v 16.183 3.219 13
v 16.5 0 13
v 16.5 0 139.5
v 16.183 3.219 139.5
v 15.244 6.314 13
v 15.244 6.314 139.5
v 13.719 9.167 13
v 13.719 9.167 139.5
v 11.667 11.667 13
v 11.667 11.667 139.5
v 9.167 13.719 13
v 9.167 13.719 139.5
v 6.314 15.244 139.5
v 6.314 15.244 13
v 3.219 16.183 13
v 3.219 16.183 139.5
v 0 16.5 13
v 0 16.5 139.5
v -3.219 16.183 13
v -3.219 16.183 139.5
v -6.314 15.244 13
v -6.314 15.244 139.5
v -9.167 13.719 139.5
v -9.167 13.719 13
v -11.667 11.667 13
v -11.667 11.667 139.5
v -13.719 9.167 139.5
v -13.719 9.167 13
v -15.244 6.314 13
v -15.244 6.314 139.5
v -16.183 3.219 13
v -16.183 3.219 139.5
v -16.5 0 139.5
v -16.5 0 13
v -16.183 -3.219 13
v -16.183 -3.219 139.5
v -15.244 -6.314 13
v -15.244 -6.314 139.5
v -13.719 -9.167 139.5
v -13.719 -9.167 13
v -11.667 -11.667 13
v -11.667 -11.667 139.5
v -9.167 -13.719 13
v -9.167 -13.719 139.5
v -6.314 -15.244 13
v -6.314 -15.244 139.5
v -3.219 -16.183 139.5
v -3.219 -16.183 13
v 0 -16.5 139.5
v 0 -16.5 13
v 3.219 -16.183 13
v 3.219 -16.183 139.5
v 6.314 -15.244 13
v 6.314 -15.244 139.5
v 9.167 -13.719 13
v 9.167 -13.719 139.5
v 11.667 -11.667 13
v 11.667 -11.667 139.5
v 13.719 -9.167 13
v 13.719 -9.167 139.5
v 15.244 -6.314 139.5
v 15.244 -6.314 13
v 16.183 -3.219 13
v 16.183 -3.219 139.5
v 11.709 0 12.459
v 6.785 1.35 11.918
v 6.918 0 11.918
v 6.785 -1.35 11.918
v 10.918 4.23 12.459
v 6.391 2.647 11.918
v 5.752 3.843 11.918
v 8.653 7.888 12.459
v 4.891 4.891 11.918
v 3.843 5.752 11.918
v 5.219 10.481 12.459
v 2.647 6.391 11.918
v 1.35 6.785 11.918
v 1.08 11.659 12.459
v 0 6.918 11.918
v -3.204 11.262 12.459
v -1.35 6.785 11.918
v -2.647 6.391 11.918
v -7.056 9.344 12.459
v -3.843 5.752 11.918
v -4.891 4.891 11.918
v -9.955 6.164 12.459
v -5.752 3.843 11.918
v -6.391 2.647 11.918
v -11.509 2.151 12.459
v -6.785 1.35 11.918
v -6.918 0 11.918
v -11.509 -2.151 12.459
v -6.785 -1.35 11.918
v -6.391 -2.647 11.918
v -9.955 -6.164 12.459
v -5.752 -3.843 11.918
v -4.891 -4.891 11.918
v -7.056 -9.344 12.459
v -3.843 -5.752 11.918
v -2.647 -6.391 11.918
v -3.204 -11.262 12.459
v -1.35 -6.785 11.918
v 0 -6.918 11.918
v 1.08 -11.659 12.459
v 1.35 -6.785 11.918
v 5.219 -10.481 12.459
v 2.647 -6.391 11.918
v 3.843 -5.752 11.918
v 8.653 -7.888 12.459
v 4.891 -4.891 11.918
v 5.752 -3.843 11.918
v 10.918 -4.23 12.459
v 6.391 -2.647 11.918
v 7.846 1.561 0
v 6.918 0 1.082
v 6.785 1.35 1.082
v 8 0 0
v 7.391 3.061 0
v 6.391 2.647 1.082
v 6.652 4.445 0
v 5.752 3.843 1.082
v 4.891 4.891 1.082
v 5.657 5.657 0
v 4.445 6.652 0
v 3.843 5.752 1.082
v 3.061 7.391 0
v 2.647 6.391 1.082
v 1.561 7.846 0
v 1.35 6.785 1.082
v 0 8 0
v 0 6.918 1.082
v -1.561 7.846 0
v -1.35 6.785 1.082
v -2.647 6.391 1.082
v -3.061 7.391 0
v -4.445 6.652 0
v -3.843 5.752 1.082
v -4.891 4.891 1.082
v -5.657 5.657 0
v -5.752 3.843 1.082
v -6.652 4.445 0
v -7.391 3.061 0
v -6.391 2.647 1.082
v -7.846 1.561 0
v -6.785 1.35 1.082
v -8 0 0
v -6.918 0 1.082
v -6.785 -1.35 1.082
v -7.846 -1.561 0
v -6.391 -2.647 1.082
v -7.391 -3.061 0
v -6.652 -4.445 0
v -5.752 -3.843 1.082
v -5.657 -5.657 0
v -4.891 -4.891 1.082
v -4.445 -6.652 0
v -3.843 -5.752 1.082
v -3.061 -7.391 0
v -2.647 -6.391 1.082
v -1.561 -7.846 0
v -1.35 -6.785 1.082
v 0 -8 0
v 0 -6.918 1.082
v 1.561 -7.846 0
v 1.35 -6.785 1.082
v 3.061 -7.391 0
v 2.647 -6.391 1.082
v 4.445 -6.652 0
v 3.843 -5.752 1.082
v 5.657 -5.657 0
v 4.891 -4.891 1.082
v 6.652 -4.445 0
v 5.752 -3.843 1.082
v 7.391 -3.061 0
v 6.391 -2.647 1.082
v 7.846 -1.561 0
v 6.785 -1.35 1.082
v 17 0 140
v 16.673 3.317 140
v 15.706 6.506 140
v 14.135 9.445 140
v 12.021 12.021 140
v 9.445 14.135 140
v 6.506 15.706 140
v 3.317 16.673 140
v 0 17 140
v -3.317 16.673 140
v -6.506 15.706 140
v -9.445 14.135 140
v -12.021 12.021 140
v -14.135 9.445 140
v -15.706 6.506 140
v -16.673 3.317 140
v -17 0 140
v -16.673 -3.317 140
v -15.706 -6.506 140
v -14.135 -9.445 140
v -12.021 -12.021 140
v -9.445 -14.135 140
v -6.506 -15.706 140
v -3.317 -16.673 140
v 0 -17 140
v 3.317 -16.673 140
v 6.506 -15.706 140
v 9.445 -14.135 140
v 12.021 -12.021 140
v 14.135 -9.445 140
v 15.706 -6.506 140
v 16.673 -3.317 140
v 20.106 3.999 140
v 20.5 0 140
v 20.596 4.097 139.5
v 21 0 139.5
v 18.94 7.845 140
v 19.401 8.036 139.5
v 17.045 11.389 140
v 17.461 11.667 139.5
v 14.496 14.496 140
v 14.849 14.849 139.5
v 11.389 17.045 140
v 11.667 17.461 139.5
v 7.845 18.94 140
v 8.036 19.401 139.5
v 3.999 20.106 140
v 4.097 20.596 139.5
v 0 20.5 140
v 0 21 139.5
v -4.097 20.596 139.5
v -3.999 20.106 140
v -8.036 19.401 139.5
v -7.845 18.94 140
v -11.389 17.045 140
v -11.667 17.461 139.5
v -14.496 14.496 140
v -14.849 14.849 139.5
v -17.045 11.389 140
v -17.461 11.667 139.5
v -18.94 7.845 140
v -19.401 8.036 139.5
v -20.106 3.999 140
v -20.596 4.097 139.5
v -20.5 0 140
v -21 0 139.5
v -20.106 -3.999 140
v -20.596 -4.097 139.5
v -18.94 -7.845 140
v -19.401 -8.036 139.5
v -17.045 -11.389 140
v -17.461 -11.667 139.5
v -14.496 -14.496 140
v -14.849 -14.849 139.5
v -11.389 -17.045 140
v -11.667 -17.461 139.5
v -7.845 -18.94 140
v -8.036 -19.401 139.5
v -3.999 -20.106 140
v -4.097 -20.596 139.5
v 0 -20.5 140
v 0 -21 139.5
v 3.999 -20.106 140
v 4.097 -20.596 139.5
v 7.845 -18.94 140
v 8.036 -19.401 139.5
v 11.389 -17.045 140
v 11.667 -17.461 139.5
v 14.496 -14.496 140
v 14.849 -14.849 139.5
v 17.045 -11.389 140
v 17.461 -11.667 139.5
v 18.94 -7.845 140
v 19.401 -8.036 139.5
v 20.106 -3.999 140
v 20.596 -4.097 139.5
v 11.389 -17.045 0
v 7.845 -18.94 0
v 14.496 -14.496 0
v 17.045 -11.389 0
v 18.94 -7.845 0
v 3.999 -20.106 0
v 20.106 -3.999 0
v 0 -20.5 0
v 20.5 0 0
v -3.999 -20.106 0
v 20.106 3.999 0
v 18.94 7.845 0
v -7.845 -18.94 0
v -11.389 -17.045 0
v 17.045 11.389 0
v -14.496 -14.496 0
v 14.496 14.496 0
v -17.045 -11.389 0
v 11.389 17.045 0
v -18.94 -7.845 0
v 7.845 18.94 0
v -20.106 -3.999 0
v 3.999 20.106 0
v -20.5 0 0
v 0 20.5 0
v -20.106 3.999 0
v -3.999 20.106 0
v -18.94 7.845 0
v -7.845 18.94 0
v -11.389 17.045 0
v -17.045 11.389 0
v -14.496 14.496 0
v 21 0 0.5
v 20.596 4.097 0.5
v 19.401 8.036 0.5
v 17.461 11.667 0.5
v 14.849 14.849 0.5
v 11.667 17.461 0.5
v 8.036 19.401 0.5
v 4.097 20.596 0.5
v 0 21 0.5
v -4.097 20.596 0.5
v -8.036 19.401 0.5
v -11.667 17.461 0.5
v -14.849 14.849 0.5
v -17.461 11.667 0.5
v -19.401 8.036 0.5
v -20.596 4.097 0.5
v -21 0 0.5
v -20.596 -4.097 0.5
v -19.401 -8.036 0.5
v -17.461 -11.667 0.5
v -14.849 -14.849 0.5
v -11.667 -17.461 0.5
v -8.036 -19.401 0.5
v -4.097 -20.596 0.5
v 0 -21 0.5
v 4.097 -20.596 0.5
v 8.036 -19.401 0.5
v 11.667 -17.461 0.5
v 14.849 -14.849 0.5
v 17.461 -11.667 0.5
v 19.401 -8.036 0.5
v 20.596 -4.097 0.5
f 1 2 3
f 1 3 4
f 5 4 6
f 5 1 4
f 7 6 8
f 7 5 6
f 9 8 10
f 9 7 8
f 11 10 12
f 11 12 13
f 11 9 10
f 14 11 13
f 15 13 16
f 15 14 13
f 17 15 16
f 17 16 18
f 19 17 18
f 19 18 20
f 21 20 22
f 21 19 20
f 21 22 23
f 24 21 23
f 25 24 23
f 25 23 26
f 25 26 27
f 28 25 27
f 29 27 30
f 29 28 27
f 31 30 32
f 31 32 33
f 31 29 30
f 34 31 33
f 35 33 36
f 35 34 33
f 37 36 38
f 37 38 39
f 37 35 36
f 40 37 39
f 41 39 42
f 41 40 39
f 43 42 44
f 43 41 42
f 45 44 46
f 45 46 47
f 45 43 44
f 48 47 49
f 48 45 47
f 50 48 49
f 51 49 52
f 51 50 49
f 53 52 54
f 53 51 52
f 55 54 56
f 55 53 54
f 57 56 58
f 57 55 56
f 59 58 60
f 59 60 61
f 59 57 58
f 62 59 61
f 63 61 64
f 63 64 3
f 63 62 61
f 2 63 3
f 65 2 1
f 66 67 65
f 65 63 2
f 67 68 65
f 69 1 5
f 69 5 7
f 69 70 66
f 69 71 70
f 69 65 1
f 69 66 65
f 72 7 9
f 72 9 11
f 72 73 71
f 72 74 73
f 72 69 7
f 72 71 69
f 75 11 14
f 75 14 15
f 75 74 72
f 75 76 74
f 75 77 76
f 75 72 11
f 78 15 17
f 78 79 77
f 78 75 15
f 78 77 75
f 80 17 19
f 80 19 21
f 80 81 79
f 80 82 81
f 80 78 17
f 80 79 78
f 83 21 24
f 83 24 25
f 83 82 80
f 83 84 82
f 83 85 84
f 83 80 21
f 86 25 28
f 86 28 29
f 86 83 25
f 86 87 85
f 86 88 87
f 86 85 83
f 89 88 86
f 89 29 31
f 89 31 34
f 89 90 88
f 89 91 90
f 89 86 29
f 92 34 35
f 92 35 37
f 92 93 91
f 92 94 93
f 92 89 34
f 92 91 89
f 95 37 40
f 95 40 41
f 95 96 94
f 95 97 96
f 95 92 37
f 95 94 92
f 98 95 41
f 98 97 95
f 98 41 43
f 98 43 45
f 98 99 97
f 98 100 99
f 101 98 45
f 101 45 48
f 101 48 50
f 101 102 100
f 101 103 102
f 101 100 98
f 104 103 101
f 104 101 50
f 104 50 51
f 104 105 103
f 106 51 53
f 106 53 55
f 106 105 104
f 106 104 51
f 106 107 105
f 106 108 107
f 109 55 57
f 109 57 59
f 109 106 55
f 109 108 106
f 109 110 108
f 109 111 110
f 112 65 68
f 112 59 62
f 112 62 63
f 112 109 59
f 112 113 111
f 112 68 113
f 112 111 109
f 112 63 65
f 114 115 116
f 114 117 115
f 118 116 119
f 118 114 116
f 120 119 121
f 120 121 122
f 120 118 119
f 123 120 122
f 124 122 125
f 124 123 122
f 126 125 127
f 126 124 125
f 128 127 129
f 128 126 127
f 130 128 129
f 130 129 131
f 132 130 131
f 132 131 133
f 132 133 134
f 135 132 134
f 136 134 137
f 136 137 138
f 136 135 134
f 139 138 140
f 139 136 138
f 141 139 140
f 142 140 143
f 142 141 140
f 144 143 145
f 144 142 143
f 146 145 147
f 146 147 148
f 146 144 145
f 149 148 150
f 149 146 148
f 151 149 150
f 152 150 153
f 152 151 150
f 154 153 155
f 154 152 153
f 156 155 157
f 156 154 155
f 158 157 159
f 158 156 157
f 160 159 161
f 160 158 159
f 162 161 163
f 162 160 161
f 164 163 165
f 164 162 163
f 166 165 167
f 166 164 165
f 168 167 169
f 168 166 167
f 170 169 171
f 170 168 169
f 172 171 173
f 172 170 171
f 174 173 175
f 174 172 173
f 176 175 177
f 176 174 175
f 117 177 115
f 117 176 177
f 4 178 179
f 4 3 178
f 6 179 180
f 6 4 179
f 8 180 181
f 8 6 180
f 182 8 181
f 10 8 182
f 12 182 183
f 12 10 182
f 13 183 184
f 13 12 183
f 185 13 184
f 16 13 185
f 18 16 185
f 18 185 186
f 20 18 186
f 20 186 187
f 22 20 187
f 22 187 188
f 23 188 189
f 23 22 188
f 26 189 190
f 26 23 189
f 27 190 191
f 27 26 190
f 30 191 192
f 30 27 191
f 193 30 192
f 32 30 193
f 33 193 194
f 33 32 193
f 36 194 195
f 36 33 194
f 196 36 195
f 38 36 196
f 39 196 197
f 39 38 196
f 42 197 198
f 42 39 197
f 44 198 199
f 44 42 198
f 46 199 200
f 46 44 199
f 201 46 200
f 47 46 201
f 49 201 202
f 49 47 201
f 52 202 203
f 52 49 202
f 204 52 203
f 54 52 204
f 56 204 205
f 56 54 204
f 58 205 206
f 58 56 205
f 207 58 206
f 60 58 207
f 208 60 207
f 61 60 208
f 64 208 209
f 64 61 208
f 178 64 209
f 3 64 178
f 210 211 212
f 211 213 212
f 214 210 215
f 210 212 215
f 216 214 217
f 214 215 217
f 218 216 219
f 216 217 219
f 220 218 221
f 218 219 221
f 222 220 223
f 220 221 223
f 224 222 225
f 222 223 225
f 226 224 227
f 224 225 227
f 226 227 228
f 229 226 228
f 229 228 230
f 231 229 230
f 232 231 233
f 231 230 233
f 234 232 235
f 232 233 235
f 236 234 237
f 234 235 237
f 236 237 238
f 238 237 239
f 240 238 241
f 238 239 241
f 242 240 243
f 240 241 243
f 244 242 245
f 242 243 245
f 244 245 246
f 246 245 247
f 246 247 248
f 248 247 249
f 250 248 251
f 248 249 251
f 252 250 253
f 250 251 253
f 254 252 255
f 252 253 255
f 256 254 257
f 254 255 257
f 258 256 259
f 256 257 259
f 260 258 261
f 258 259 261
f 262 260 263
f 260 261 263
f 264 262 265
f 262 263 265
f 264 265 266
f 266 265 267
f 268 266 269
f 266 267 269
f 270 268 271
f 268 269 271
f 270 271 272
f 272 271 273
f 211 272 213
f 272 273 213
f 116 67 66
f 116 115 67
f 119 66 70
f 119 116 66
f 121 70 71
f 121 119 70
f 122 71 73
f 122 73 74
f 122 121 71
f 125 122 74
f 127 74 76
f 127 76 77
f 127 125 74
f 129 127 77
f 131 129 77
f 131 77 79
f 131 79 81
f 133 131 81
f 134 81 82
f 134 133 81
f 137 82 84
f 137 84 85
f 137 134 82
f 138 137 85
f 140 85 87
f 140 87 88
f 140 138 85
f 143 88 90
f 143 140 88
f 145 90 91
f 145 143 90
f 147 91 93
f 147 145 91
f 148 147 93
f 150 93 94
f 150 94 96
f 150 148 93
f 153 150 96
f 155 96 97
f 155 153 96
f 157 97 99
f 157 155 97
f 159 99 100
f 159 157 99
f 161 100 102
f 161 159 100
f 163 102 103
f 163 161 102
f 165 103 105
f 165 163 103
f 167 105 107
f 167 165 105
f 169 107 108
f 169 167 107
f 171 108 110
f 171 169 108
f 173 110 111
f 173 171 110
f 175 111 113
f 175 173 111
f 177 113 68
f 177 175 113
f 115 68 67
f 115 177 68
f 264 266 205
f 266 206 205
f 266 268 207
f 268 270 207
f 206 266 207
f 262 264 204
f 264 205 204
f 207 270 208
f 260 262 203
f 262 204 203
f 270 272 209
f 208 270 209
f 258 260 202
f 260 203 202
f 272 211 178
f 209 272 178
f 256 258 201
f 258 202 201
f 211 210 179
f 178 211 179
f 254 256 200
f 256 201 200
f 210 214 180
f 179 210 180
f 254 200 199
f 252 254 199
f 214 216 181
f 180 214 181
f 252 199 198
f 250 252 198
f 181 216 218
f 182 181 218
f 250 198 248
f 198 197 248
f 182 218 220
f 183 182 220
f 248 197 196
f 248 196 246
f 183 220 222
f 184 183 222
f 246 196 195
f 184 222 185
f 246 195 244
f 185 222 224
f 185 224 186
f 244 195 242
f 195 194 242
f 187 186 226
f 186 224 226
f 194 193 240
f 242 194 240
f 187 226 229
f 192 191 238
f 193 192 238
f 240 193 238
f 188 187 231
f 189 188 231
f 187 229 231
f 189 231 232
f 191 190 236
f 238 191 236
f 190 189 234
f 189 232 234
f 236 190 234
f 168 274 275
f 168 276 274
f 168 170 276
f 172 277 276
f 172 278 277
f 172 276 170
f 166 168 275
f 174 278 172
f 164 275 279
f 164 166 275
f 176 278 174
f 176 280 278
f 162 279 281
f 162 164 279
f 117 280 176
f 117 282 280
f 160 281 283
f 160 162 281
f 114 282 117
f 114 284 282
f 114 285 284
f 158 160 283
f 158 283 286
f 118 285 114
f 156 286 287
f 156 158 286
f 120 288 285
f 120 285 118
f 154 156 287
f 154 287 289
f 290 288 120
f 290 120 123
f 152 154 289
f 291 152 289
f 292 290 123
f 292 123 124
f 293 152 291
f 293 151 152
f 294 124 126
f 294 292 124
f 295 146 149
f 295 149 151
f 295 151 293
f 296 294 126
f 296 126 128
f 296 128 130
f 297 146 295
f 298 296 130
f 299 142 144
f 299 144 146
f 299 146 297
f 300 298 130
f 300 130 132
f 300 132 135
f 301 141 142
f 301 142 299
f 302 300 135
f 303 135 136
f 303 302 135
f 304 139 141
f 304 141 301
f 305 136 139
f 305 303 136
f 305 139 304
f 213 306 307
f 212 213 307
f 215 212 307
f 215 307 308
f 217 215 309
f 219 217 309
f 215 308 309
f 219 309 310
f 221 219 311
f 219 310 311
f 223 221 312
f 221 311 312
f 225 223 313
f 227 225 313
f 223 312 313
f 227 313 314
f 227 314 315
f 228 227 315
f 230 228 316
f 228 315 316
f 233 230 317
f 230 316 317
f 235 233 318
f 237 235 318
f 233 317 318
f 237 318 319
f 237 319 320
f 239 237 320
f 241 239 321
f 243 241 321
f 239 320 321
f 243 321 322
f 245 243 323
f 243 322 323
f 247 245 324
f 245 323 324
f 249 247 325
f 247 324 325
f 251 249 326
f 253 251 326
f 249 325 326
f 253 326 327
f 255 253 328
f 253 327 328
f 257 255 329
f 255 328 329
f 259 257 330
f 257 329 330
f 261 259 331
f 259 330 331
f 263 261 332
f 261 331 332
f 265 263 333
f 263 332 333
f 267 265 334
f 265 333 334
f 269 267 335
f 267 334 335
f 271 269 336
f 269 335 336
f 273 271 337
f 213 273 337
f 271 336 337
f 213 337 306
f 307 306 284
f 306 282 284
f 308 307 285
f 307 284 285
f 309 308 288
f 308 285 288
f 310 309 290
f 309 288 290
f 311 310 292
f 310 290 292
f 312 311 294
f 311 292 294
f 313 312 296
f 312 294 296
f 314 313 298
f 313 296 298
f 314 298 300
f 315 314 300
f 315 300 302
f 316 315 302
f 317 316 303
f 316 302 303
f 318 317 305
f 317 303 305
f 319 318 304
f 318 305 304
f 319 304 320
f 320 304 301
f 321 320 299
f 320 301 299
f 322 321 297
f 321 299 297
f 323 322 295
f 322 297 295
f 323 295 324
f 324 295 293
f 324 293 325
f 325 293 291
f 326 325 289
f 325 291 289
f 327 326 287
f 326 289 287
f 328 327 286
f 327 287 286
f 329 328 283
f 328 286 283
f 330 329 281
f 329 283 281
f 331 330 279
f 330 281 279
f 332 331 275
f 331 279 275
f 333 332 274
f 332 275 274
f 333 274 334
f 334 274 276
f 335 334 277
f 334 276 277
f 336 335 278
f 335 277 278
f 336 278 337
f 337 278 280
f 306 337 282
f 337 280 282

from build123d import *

# Parameters (mm, degrees)
SZKIC1_W = 140
SZKIC1_H = 21


with BuildPart() as part:
    # Szkic1 → Obrót1 (revolve)
    with BuildSketch(Plane(origin=(0, 0, 0), x_dir=(0, 0, -1), z_dir=(1, 0, 0))):
        with Locations((-70, 10.5)):
            Rectangle(SZKIC1_W, SZKIC1_H)
    revolve(axis=Axis((0, 0, 0), (0, 0, 1)))

    # Szkic2 → Wycięcie-obrót1 (revolve, cut)
    with BuildSketch(Plane(origin=(0, 0, 0), x_dir=(0, 0, -1), z_dir=(1, 0, 0))):
        Polygon((-140, 20.5), (-139.5, 21), (-140, 21), align=None)
    revolve(axis=Axis((0, 0, 0), (0, 0, 1)), mode=Mode.SUBTRACT)

    # Szkic3 → Wycięcie-obrót2 (revolve, cut)
    with BuildSketch(Plane(origin=(0, 0, 0), x_dir=(0, 0, -1), z_dir=(1, 0, 0))):
        Polygon((-0.5, 21), (0, 20.5), (0, 21), align=None)
    revolve(axis=Axis((0, 0, 0), (0, 0, 1)), mode=Mode.SUBTRACT)

    # Szkic4 → Wycięcie-obrót3 (revolve, cut)
    with BuildSketch(Plane(origin=(0, 0, 0), x_dir=(0, 0, -1), z_dir=(1, 0, 0))):
        Polygon((-13, 0), (-13, 16.5), (-11.9175, 6.9175), (-1.0825, 6.9175), (0, 8), (0, 0), align=None)
    revolve(axis=Axis((0, 0, 0), (0, 0, 1)), mode=Mode.SUBTRACT)

    # Szkic5 → Wycięcie-obrót4 (revolve, cut)
    with BuildSketch(Plane(origin=(0, 0, 0), x_dir=(0, 0, -1), z_dir=(1, 0, 0))):
        Polygon((-140, 0), (-140, 17), (-139.5, 16.5), (-13, 16.5), (-13, 0), align=None)
    revolve(axis=Axis((0, 0, 13), (0, 0, 1)), mode=Mode.SUBTRACT)


solid = part.part
